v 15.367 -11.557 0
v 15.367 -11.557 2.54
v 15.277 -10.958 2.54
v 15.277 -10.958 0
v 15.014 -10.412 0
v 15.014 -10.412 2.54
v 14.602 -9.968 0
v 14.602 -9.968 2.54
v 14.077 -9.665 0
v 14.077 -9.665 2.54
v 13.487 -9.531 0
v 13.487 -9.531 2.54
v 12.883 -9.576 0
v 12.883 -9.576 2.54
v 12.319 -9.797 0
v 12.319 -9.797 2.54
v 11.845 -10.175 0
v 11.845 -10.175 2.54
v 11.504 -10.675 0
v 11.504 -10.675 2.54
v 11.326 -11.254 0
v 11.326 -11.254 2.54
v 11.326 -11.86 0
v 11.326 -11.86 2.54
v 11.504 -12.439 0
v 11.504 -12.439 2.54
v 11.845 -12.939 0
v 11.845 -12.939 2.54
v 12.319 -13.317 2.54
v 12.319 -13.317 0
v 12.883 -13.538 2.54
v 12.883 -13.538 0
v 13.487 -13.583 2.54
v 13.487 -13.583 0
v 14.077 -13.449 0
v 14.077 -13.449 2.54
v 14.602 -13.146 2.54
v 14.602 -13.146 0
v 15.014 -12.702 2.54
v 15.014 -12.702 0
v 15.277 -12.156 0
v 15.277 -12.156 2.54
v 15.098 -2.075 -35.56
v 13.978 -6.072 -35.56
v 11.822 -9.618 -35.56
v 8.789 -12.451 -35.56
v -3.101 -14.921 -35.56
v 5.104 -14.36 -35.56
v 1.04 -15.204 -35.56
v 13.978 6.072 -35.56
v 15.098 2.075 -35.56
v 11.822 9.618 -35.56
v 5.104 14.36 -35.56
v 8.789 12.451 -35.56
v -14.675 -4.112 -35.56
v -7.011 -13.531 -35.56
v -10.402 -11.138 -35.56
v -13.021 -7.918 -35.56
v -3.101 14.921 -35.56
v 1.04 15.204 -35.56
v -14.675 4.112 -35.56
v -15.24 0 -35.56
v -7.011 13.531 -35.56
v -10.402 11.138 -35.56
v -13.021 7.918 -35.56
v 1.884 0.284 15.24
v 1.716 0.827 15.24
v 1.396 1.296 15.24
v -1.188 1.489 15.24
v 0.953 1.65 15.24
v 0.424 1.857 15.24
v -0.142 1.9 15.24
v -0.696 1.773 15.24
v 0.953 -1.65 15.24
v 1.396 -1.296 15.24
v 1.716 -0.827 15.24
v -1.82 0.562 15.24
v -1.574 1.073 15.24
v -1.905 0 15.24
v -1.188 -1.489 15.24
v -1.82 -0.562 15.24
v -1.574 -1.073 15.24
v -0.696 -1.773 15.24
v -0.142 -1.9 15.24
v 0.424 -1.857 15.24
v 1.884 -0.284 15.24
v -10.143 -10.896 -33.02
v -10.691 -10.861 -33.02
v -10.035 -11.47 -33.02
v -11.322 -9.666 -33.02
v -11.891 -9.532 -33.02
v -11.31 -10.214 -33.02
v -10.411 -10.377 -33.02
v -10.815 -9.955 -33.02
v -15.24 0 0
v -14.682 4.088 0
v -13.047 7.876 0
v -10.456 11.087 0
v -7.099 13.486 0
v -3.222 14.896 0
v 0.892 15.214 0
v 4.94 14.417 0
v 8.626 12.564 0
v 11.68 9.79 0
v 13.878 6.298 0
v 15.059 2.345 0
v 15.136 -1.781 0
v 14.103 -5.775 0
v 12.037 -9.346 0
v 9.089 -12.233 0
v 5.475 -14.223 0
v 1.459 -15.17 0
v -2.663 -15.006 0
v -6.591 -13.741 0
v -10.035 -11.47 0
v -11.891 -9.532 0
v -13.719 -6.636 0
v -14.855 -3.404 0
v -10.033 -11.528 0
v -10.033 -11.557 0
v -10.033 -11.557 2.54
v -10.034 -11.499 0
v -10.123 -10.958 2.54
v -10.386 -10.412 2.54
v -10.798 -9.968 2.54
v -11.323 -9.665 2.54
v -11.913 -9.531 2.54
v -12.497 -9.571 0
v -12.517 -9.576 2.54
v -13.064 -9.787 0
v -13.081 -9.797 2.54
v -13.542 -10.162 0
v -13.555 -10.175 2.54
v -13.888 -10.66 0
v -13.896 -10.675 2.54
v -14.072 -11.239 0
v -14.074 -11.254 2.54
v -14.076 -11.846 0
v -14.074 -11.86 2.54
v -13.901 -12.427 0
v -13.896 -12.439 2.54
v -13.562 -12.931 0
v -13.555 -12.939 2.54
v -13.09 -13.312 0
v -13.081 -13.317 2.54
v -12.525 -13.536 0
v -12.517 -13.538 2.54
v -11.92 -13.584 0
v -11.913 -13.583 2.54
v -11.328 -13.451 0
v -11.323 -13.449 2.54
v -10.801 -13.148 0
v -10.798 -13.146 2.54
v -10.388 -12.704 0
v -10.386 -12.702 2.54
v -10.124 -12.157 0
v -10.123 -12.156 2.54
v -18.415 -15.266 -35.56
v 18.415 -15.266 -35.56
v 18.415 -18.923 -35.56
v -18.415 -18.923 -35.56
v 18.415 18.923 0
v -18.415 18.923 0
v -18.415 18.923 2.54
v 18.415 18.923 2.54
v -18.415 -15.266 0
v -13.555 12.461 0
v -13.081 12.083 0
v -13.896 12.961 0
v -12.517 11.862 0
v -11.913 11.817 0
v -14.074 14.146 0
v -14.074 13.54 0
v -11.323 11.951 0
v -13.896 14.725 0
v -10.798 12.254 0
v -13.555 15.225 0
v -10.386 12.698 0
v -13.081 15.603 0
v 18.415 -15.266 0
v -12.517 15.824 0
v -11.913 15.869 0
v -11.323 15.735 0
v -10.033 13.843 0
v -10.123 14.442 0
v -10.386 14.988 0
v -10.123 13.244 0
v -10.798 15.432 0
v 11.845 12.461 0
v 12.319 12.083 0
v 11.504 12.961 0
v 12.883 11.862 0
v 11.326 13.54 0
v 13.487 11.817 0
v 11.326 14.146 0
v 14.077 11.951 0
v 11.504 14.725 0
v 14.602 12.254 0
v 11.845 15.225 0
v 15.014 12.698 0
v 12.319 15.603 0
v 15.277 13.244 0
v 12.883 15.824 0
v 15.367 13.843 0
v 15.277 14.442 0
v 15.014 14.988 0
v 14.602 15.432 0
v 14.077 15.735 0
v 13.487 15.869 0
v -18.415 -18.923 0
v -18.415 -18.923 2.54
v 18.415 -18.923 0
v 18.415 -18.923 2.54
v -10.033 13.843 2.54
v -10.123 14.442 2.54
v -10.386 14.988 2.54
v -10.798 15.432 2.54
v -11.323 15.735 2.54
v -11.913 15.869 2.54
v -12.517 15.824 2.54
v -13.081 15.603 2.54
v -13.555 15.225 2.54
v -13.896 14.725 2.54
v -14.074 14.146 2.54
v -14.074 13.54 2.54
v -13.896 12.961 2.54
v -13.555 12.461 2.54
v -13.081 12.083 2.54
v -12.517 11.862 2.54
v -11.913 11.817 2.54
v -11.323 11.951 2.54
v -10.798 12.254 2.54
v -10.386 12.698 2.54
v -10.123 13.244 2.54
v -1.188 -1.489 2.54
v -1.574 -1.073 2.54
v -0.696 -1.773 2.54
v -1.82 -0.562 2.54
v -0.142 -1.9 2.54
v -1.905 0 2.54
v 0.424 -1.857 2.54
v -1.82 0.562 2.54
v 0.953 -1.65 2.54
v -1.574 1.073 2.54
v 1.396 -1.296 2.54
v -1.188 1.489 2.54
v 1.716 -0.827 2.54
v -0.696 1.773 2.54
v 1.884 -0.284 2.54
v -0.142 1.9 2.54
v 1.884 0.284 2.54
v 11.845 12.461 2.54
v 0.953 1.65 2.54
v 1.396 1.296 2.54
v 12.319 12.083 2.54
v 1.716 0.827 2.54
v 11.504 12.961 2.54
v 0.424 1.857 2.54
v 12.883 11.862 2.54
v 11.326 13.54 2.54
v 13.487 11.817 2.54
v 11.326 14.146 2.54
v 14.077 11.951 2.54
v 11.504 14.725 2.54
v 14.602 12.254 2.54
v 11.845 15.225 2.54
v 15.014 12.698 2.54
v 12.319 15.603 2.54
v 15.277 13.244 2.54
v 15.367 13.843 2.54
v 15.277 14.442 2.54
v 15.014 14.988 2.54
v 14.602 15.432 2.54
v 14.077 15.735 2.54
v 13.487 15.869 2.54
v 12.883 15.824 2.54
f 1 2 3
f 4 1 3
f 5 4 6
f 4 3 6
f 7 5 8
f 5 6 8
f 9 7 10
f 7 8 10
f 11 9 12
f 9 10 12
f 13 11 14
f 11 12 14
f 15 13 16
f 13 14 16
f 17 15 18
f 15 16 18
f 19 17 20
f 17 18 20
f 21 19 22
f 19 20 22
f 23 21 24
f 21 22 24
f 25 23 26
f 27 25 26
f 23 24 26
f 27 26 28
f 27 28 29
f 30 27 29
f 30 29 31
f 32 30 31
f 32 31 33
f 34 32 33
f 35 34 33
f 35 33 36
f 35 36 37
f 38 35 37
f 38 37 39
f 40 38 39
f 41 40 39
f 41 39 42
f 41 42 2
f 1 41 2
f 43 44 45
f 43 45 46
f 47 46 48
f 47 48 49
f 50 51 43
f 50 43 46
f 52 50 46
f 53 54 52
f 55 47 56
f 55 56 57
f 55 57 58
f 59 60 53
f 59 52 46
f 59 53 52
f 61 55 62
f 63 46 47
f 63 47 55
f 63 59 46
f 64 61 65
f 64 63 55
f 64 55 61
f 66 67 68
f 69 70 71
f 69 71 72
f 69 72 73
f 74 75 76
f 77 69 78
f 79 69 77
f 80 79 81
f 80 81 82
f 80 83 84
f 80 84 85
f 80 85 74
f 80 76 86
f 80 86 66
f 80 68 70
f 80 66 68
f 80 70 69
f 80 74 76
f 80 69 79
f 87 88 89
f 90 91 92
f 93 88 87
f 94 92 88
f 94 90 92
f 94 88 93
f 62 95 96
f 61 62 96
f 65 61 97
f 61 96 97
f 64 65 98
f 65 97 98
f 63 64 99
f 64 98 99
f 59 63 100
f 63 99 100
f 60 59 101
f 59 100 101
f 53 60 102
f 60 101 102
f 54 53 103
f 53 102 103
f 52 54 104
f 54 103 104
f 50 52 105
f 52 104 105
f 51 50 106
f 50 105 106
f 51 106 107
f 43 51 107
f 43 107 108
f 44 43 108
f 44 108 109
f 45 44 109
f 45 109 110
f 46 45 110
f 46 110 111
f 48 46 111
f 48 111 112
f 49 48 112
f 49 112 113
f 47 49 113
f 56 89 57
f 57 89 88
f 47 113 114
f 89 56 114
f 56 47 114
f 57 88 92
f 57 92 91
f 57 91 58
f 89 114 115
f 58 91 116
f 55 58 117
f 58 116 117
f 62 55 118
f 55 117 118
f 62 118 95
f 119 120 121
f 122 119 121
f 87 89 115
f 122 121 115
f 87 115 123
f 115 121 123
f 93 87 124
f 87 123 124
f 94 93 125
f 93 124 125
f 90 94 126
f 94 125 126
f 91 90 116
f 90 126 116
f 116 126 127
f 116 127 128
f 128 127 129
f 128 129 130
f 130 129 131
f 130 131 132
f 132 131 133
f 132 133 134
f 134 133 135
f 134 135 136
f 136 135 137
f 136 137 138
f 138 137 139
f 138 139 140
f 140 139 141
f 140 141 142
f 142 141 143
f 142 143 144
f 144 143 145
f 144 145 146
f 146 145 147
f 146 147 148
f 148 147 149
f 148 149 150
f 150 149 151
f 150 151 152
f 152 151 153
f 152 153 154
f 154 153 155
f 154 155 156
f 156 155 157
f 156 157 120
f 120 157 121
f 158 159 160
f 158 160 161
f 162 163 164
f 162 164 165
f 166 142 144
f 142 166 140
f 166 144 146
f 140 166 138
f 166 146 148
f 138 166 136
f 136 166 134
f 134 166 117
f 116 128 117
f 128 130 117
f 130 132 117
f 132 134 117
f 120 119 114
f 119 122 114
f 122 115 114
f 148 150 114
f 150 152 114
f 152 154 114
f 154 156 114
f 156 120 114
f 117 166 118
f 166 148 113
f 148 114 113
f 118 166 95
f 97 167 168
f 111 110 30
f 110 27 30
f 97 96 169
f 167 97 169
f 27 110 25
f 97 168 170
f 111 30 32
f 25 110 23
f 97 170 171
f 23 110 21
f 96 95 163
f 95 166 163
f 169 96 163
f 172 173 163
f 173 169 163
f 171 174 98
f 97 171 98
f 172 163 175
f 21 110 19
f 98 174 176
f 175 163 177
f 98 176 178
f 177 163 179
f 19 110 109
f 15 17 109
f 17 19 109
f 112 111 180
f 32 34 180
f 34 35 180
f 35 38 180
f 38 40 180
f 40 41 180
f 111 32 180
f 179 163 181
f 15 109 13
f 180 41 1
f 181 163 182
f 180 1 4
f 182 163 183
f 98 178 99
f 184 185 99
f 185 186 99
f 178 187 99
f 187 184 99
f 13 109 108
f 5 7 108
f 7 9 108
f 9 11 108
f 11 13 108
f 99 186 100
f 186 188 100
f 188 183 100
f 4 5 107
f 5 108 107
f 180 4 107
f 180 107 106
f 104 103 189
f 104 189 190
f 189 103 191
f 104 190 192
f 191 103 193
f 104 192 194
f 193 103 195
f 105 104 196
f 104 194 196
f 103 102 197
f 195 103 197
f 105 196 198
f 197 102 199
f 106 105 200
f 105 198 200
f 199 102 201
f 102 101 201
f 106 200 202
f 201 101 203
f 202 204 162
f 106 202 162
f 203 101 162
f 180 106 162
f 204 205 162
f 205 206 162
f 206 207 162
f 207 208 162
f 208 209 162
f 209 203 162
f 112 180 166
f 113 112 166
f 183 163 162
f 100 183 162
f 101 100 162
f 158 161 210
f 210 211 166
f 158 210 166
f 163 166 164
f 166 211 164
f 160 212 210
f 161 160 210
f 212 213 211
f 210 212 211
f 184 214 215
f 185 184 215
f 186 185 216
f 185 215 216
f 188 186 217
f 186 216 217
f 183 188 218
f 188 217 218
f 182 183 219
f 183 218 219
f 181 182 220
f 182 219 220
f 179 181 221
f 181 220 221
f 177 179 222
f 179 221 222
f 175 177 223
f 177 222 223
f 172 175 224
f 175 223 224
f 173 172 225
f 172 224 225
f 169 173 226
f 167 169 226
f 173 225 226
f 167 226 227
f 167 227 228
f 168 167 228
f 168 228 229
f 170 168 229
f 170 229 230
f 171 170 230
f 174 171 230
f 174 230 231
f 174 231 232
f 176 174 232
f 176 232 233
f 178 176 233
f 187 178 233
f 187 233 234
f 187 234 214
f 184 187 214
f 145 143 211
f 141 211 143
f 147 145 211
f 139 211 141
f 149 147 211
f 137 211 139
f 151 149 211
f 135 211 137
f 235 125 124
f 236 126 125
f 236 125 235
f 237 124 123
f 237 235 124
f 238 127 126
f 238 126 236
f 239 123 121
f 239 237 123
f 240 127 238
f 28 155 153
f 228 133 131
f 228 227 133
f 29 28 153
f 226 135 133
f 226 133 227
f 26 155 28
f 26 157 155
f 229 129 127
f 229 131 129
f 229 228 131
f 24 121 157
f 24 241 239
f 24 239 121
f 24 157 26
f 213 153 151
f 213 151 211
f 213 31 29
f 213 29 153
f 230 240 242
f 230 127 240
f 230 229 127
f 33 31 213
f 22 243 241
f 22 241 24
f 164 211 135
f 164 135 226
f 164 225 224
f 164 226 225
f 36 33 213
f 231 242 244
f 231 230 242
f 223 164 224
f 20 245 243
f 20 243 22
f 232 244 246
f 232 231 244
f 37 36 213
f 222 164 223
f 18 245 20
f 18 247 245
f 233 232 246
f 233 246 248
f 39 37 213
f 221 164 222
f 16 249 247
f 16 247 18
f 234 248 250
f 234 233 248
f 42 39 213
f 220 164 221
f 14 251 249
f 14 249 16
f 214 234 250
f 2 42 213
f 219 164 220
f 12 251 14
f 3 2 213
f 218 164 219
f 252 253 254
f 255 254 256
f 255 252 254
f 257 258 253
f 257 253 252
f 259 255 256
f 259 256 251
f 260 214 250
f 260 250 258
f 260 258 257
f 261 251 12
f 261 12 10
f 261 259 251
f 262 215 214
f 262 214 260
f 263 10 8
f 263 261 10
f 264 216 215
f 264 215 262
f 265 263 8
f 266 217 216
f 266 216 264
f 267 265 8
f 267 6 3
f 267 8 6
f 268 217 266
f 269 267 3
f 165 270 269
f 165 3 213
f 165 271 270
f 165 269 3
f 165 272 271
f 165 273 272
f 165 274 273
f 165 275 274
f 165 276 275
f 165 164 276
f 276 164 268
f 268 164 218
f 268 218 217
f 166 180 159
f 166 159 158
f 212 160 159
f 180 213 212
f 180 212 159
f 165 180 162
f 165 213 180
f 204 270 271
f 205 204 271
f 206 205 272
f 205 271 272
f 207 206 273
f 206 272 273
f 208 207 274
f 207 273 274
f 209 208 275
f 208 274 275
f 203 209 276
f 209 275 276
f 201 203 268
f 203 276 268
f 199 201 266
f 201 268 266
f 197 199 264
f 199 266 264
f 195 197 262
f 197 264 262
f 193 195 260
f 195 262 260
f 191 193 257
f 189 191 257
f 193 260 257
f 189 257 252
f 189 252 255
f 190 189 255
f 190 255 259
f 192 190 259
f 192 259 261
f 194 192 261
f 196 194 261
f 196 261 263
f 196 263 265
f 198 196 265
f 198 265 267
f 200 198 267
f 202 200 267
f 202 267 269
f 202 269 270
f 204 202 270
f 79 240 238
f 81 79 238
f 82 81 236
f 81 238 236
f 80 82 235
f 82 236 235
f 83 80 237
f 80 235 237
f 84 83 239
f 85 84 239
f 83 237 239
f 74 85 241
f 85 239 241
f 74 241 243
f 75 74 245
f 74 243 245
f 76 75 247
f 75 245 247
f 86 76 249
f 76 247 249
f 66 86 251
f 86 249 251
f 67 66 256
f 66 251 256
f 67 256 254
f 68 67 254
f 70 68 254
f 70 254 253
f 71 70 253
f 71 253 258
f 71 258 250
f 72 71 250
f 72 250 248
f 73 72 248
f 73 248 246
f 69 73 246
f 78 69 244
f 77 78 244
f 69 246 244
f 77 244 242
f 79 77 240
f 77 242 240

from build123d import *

# Parameters (mm, degrees)
SKETCH1_W           = 36.83
SKETCH1_H           = 37.846
BOSS_EXTRUDE1_DEPTH = 2.54
SKETCH2_R           = 1.905
BOSS_EXTRUDE2_DEPTH = 12.7
SKETCH3_R           = 15.24
BOSS_EXTRUDE3_DEPTH = 35.56
SKETCH4_W           = 36.83
SKETCH4_H           = 3.657403599
BOSS_EXTRUDE4_DEPTH = 35.56
SKETCH5_R           = 2.032
CUT_EXTRUDE1_DEPTH  = 35.56


with BuildPart() as part:
    # Sketch1 → Boss-Extrude1 (new body)
    with BuildSketch(Plane.XY):
        Rectangle(SKETCH1_W, SKETCH1_H)
    extrude(amount=BOSS_EXTRUDE1_DEPTH)

    # Sketch2 → Boss-Extrude2 (add)
    with BuildSketch(Plane.XY.offset(2.54)):
        with Locations(Location((0, 0, 0), (0, 0, 180))):  # turned: the seam where the file's is
            Circle(SKETCH2_R)
    extrude(amount=BOSS_EXTRUDE2_DEPTH)

    # Sketch3 → Boss-Extrude3 (add)
    with BuildSketch(Plane(origin=(0, 0, 0), x_dir=(-1, 0, 0), z_dir=(0, 0, -1))):
        Circle(SKETCH3_R)
    extrude(amount=BOSS_EXTRUDE3_DEPTH)

    # Sketch4 → Boss-Extrude4 (add)
    with BuildSketch(Plane(origin=(0, 0, 0), x_dir=(-1, 0, 0), z_dir=(0, 0, -1))):
        with Locations((0, -17.094298201)):
            Rectangle(SKETCH4_W, SKETCH4_H)
    extrude(amount=BOSS_EXTRUDE4_DEPTH)

    # Sketch5 → Cut-Extrude1 (cut)
    with BuildSketch(Plane.XY.offset(2.54)):
        with Locations((13.335, 13.843)):
            Circle(SKETCH5_R)
        with Locations((-12.065, 13.843)):
            Circle(SKETCH5_R)
        with Locations((-12.065, -11.557)):
            Circle(SKETCH5_R)
        with Locations((13.335, -11.557)):
            Circle(SKETCH5_R)
    extrude(amount=-CUT_EXTRUDE1_DEPTH, mode=Mode.SUBTRACT)


solid = part.part
